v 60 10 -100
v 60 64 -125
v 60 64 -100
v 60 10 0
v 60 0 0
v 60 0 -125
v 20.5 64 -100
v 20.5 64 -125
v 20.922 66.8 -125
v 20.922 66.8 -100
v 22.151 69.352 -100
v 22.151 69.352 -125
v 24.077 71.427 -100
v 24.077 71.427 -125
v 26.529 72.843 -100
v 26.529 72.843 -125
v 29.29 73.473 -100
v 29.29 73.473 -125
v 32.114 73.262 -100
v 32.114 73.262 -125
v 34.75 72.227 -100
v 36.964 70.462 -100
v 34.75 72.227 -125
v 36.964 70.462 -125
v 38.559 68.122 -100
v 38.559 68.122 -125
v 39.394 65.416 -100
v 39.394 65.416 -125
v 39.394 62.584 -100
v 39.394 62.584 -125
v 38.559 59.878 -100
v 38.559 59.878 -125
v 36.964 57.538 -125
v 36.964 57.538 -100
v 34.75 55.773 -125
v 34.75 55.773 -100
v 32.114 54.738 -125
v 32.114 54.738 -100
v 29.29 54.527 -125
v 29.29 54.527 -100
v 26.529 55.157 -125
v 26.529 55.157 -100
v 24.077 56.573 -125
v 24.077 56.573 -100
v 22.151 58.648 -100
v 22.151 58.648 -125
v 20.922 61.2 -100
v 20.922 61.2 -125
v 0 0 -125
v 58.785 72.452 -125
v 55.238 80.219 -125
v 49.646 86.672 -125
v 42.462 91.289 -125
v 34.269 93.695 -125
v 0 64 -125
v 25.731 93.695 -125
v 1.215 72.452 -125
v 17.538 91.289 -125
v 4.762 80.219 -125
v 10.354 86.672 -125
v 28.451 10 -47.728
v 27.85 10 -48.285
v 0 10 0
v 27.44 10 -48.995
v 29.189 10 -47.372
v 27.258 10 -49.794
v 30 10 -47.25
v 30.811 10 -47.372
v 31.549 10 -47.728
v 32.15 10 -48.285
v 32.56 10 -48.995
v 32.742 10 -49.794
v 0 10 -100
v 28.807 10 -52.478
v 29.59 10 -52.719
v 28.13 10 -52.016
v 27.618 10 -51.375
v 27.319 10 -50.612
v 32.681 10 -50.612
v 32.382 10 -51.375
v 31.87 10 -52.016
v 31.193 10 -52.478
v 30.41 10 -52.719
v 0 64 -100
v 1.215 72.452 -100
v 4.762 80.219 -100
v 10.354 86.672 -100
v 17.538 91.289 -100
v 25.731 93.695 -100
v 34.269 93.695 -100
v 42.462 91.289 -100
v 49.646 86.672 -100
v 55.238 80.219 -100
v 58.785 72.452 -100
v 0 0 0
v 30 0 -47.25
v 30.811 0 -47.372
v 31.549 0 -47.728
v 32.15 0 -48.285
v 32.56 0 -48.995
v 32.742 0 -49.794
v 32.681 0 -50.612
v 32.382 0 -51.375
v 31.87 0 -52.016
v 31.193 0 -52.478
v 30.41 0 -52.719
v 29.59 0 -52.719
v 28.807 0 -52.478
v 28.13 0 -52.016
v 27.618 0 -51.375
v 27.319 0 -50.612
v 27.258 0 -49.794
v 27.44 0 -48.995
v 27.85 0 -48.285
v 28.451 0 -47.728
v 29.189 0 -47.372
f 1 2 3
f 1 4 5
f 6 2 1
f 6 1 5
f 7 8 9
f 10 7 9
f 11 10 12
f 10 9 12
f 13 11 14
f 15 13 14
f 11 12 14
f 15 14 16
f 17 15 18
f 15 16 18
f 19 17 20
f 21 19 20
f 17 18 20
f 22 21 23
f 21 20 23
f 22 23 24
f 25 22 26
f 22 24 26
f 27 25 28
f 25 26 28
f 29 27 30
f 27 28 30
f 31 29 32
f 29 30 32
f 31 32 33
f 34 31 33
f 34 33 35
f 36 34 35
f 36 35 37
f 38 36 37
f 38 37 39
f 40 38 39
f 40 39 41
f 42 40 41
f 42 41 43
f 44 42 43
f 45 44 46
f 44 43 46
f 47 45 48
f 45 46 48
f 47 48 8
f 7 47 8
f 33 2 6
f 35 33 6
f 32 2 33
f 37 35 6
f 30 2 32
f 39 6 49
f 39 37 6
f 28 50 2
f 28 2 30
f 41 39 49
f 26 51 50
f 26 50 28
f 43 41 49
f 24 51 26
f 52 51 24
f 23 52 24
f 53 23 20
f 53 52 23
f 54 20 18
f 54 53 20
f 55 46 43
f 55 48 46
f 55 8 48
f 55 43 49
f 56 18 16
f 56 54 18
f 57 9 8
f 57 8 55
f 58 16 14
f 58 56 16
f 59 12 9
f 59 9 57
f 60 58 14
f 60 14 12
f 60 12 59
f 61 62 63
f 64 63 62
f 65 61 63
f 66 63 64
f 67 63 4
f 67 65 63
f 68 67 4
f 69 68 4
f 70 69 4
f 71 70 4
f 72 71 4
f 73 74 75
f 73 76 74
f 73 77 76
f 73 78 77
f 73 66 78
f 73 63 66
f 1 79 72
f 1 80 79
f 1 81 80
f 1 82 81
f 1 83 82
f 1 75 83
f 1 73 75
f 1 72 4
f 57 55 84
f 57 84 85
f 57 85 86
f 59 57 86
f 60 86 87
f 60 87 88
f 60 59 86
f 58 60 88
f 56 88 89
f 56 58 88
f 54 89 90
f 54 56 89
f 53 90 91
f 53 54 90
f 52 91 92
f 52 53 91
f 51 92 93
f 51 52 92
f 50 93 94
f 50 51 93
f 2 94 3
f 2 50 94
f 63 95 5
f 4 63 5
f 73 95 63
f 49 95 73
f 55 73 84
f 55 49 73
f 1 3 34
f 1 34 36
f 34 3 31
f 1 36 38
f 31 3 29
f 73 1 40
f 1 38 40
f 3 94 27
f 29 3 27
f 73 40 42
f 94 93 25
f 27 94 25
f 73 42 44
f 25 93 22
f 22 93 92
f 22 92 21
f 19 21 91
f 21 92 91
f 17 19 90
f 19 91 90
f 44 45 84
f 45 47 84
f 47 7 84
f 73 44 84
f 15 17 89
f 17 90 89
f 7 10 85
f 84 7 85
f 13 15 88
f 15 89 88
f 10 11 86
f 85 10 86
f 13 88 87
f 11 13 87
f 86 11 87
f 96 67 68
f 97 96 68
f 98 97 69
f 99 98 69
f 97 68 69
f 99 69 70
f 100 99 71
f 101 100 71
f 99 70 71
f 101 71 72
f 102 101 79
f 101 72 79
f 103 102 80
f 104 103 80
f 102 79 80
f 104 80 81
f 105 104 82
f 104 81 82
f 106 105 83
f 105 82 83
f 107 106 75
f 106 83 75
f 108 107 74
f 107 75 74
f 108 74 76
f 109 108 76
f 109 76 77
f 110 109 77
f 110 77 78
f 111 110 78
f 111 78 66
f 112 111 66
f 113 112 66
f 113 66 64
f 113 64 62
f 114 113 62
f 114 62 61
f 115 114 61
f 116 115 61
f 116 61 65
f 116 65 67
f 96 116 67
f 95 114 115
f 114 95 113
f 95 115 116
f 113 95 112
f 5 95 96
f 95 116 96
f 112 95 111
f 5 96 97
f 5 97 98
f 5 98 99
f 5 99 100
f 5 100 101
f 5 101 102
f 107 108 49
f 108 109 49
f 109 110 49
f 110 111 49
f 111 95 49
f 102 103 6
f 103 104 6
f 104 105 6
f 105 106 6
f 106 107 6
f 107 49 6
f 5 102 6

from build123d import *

# Parameters (mm, degrees)
SKETCH1_W           = 60
SKETCH1_H           = 125
BOSS_EXTRUDE1_DEPTH = 10
SKETCH2_R           = 9.5
BOSS_EXTRUDE2_DEPTH = 25
CUT_EXTRUDE1_REACH  = 164.114
SKETCH3_R           = 2.75


with BuildPart() as part:
    # Sketch1 → Boss-Extrude1 (new body)
    with BuildSketch(Plane(origin=(0, 0, 0), x_dir=(1, 0, 0), z_dir=(0, 1, 0))):
        with Locations((30, 62.5)):
            Rectangle(SKETCH1_W, SKETCH1_H)
    extrude(amount=BOSS_EXTRUDE1_DEPTH)

    # Sketch2 → Boss-Extrude2 (add)
    with BuildSketch(Plane(origin=(0, 0, -125), x_dir=(-1, 0, 0), z_dir=(0, 0, -1))):
        with BuildLine():
            Line((-60, 10), (0, 10))
            Line((0, 10), (0, 64))
            ThreePointArc((0, 64), (-30, 94), (-60, 64))
            Line((-60, 64), (-60, 10))
        make_face()
        with Locations((-30, 64)):
            Circle(SKETCH2_R, mode=Mode.SUBTRACT)
    extrude(amount=-BOSS_EXTRUDE2_DEPTH)

    # Sketch3 → Cut-Extrude1 (cut, up to next)
    with BuildSketch(Plane(origin=(0, 10, 0), x_dir=(1, 0, 0), z_dir=(0, 1, 0)), mode=Mode.PRIVATE) as cut_extrude1_sk1:
        with Locations(Location((30, 50, 0), (0, 0, 270))):
            Circle(SKETCH3_R)
    cut_extrude1_tool1 = extrude(cut_extrude1_sk1.sketch, amount=-CUT_EXTRUDE1_REACH, mode=Mode.PRIVATE) & part.part
    add(cut_extrude1_tool1.solids().sort_by_distance((30, 10, -50))[0], mode=Mode.SUBTRACT)


solid = part.part
